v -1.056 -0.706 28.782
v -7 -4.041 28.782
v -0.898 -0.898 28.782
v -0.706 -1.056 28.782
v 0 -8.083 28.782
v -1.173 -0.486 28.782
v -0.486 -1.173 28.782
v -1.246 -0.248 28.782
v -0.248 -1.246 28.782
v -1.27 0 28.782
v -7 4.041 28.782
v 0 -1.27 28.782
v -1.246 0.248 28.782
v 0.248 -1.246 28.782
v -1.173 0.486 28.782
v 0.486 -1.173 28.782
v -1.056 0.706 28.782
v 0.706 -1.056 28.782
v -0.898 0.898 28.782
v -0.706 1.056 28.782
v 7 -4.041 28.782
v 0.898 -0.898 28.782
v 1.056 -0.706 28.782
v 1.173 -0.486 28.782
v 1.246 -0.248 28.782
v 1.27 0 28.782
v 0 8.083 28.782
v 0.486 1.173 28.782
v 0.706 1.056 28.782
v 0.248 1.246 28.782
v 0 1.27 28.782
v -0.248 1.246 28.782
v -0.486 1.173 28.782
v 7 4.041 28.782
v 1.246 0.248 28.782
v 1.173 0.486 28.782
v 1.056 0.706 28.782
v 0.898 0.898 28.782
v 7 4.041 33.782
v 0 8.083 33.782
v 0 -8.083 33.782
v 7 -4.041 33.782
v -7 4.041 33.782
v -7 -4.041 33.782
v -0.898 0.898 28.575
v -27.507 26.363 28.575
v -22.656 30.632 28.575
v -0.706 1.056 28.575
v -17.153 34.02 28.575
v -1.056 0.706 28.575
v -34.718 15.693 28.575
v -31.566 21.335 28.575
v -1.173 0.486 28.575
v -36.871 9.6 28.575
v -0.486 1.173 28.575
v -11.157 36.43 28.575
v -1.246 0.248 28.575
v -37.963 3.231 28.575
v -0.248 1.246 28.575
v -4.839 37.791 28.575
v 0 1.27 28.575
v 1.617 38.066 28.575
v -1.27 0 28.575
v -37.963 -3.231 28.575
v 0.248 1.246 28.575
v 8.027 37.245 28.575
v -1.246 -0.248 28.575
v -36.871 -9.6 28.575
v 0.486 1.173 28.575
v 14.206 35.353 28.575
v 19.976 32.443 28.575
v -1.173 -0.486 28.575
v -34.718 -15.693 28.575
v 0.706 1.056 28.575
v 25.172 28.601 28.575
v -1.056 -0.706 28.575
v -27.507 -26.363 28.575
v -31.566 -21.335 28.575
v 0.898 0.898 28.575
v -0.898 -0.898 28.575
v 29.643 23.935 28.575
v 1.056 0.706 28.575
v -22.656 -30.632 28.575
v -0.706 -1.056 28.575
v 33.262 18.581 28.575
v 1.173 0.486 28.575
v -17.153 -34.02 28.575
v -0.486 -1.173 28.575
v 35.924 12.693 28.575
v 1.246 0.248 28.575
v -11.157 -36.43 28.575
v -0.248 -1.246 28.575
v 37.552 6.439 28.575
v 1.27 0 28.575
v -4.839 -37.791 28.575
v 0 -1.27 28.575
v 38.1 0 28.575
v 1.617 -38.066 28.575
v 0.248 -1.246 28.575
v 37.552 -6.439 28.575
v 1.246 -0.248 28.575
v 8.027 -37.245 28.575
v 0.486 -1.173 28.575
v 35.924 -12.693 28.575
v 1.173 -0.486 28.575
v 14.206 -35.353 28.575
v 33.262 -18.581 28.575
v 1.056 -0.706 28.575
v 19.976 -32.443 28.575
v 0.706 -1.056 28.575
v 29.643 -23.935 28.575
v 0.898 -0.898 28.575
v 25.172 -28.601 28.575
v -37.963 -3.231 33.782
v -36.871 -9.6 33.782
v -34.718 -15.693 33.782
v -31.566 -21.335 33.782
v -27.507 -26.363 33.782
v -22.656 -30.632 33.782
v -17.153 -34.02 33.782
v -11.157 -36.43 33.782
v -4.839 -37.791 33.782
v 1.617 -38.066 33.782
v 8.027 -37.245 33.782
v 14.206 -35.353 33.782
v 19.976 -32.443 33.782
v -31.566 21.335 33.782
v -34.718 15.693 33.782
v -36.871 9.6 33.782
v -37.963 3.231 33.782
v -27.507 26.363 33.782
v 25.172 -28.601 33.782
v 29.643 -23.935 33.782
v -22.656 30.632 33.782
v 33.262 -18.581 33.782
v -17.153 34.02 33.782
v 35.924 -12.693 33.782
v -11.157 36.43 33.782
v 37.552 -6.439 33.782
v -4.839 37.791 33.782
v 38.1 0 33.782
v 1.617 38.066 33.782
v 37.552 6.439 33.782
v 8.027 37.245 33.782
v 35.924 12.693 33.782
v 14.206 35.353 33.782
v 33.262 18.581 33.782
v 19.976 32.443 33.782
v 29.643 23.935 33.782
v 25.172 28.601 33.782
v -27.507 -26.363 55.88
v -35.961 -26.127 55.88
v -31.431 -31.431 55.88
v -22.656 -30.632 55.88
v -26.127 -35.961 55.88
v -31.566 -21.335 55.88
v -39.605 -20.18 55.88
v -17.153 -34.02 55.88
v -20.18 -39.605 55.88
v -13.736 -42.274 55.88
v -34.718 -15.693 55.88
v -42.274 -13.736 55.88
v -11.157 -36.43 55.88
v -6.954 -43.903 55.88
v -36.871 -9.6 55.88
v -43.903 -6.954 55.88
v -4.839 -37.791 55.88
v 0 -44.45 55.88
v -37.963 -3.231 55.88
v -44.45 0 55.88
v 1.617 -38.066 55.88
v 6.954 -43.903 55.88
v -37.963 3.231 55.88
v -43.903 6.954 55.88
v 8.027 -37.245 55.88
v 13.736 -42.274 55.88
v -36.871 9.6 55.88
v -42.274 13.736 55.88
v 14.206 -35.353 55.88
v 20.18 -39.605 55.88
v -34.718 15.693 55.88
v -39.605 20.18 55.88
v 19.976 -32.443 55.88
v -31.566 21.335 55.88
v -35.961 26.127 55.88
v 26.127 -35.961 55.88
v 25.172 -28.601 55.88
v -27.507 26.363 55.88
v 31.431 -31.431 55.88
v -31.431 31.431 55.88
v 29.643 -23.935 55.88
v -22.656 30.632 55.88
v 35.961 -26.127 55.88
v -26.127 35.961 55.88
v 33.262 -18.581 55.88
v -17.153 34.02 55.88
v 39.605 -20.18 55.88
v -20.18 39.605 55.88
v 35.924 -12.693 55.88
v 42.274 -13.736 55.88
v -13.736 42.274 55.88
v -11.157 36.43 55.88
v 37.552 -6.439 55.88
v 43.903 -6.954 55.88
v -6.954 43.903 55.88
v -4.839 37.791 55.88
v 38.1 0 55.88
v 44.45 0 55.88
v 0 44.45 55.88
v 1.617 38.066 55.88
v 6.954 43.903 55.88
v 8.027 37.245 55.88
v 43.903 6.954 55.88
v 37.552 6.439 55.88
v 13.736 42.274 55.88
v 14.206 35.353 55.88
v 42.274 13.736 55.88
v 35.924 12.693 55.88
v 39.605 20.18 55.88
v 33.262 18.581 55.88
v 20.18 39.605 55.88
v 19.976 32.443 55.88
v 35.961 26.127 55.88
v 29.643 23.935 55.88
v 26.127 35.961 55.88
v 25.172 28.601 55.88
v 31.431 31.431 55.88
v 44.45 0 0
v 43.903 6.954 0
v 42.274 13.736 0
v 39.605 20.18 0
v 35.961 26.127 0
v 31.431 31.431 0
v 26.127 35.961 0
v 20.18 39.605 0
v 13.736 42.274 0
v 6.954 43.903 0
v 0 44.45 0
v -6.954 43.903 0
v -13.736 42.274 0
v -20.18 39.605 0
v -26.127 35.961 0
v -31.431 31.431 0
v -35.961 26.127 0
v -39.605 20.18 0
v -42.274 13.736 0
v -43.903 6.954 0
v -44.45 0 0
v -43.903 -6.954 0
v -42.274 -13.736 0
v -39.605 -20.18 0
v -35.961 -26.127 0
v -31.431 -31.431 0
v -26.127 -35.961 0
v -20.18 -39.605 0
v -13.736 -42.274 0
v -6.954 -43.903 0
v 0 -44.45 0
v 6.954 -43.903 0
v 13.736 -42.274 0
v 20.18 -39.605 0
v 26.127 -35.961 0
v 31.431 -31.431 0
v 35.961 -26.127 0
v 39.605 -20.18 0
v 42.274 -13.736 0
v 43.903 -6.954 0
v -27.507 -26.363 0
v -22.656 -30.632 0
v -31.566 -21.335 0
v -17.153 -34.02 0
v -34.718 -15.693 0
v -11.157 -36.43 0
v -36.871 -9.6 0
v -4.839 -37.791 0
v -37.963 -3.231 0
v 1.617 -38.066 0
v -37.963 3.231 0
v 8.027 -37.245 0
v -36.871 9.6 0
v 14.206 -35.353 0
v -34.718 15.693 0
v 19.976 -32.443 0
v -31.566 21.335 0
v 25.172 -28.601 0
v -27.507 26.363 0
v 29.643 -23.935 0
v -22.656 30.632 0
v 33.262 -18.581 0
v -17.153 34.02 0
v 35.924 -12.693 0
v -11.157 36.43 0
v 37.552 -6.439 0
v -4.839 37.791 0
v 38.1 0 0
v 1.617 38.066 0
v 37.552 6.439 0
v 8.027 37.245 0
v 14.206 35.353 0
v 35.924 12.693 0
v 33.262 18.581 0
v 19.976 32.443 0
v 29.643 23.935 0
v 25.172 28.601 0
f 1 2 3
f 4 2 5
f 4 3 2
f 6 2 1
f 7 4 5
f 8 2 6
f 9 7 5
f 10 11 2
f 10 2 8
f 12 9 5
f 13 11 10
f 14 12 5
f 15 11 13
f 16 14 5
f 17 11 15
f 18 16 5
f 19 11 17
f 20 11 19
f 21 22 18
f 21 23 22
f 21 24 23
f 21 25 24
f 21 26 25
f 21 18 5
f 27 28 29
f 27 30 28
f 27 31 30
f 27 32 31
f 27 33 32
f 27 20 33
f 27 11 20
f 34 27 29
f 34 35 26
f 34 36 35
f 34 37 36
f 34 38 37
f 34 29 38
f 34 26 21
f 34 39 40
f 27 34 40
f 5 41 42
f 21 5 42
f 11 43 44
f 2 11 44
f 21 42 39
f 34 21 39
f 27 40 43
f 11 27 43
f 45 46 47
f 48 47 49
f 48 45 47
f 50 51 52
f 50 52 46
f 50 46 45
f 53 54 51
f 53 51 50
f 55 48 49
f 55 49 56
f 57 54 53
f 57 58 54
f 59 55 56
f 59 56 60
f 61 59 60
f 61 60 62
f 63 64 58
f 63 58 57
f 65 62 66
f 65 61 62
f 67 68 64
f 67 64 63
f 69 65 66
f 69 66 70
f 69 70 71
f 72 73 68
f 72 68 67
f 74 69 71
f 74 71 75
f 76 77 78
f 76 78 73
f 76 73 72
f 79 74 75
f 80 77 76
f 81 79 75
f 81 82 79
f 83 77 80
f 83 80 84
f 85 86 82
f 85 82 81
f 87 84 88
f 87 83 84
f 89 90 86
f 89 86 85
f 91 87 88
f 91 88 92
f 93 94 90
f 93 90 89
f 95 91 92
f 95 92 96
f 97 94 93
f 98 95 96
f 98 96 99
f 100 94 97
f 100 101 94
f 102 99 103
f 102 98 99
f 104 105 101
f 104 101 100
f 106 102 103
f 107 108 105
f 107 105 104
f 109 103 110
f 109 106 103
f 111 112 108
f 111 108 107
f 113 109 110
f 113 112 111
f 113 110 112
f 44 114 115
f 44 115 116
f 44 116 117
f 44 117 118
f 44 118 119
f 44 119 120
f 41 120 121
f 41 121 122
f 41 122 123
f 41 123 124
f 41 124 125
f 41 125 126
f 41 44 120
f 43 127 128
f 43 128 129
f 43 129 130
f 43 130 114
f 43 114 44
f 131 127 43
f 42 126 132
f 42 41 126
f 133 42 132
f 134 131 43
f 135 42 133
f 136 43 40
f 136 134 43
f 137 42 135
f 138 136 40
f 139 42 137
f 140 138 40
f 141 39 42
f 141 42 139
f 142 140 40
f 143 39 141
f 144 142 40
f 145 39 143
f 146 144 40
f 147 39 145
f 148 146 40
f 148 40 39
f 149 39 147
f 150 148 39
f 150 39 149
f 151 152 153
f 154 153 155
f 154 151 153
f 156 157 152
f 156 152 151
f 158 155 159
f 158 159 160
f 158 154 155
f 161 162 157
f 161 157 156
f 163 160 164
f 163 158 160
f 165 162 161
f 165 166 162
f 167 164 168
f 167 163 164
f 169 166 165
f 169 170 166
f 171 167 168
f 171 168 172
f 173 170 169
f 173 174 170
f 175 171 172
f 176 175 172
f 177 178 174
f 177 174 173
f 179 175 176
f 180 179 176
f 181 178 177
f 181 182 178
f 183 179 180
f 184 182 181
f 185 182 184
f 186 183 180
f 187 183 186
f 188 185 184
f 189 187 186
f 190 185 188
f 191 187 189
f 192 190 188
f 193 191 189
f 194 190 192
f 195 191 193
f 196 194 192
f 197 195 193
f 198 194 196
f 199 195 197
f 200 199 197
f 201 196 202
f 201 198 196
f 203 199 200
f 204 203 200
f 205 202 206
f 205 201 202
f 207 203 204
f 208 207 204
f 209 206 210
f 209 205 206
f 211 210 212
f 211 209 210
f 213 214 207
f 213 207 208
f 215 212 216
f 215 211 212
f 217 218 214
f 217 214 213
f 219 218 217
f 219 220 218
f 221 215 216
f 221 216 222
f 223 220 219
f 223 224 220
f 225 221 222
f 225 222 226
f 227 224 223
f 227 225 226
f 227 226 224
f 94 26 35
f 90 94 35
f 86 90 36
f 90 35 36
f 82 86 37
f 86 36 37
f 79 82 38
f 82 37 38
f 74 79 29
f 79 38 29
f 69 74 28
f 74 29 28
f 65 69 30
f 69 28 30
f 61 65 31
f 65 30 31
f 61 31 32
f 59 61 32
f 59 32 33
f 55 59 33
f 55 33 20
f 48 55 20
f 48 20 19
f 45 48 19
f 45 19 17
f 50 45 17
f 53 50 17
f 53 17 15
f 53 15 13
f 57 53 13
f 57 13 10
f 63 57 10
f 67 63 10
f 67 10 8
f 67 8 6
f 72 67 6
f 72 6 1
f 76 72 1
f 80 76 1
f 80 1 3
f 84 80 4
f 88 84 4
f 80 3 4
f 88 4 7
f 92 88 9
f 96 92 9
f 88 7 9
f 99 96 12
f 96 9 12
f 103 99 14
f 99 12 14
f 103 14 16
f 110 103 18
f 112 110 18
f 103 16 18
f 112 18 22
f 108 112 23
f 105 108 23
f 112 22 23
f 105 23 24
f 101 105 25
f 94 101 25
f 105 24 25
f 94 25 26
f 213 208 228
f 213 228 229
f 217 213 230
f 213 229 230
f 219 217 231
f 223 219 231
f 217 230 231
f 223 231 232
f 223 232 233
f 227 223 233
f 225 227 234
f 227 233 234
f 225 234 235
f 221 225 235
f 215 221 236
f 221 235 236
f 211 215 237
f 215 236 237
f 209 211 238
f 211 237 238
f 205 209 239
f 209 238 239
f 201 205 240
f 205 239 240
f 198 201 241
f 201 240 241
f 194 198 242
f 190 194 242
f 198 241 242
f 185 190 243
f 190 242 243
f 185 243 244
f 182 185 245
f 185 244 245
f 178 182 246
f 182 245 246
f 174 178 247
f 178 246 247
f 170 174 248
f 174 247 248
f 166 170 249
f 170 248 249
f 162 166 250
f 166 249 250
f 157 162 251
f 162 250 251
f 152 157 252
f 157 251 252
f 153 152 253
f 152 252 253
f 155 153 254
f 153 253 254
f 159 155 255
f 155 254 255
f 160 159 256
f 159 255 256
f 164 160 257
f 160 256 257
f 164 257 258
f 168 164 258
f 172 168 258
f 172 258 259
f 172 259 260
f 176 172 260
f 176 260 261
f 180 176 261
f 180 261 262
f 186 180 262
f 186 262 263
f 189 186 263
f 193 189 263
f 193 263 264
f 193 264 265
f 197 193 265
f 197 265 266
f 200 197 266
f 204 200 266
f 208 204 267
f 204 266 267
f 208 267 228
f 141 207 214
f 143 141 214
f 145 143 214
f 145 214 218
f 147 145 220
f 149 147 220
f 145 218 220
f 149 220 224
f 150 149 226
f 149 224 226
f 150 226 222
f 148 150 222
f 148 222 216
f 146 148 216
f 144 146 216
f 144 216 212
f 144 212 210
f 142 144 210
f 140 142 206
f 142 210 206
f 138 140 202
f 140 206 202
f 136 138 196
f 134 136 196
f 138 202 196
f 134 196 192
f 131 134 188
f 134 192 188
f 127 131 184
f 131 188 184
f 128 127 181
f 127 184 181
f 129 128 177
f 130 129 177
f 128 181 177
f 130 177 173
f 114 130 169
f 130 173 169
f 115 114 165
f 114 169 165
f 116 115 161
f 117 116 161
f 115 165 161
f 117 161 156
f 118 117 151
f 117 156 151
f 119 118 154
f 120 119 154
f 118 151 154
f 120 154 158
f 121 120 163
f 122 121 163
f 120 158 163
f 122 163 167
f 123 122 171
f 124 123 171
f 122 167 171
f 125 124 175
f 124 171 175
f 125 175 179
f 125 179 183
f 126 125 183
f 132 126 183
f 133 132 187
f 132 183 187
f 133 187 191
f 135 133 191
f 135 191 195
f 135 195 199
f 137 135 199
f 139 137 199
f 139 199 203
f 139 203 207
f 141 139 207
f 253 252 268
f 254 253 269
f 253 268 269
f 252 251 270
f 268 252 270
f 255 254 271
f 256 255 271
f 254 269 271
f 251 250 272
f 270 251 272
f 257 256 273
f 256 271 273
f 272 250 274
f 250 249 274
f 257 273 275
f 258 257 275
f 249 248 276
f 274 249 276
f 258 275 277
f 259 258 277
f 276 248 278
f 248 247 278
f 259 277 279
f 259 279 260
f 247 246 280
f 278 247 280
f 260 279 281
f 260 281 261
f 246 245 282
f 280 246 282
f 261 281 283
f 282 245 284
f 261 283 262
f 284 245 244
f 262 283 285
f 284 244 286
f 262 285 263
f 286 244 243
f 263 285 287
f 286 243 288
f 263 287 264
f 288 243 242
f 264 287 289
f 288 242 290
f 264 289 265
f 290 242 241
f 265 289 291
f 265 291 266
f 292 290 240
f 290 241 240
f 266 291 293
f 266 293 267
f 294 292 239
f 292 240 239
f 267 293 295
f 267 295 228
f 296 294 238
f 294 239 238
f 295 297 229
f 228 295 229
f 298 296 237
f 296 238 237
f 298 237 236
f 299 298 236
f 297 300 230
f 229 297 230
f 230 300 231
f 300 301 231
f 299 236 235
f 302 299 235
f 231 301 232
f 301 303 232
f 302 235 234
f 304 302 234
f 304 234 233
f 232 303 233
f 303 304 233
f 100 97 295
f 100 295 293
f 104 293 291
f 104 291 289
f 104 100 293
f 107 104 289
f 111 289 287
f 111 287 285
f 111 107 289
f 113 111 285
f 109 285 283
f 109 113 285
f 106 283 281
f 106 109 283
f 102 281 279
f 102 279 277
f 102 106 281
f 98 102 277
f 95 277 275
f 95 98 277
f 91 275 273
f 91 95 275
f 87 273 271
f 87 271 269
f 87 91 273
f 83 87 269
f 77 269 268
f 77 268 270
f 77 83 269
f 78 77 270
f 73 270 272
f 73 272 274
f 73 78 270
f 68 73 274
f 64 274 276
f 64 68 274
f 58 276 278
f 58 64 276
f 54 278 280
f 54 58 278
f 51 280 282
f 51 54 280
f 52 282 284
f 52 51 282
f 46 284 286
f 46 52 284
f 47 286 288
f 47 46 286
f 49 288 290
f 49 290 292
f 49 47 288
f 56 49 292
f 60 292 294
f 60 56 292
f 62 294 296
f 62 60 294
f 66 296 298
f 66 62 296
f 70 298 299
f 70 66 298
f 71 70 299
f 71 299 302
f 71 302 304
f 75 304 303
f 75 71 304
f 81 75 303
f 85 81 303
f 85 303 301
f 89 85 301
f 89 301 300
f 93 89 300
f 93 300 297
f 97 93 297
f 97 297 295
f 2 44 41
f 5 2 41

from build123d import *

# Parameters (mm, degrees)
SKETCH1_R           = 44.45
BOSS_EXTRUDE1_DEPTH = 55.88
SKETCH2_R           = 38.1
CUT_EXTRUDE1_DEPTH  = 22.098
CUT_EXTRUDE2_START  = -28.575
SKETCH3_R           = 38.1
CUT_EXTRUDE2_DEPTH  = 28.575
SKETCH4_R           = 1.27
CUT_EXTRUDE3_DEPTH  = 72.364056247
CUT_EXTRUDE4_DEPTH  = 5


with BuildPart() as part:
    # Sketch1 → Boss-Extrude1 (new body)
    with BuildSketch(Plane.XY):
        Circle(SKETCH1_R)
    extrude(amount=BOSS_EXTRUDE1_DEPTH)

    # Sketch2 → Cut-Extrude1 (cut)
    with BuildSketch(Plane.XY.offset(55.88)):
        Circle(SKETCH2_R)
    extrude(amount=-CUT_EXTRUDE1_DEPTH, mode=Mode.SUBTRACT)

    # Sketch3 → Cut-Extrude2 (cut)
    with BuildSketch(Plane(origin=(0, 0, 0), x_dir=(-1, 0, 0), z_dir=(0, 0, -1)).offset(CUT_EXTRUDE2_START)):
        with Locations(Location((0, 0, 0), (0, 0, 180))):
            Circle(SKETCH3_R)
    extrude(amount=CUT_EXTRUDE2_DEPTH, mode=Mode.SUBTRACT)

    # Sketch4 → Cut-Extrude3 (cut, through all)
    with BuildSketch(Plane.XY.offset(33.782)):
        Circle(SKETCH4_R)
    extrude(amount=-CUT_EXTRUDE3_DEPTH, mode=Mode.SUBTRACT)

    # Sketch5 → Cut-Extrude4 (cut)
    with BuildSketch(Plane.XY.offset(33.782)):
        Polygon((0, 8.082903769), (-7, 4.041451884), (-7, -4.041451884), (0, -8.082903769), (7, -4.041451884), (7, 4.041451884), align=None)
    extrude(amount=-CUT_EXTRUDE4_DEPTH, mode=Mode.SUBTRACT)


solid = part.part
